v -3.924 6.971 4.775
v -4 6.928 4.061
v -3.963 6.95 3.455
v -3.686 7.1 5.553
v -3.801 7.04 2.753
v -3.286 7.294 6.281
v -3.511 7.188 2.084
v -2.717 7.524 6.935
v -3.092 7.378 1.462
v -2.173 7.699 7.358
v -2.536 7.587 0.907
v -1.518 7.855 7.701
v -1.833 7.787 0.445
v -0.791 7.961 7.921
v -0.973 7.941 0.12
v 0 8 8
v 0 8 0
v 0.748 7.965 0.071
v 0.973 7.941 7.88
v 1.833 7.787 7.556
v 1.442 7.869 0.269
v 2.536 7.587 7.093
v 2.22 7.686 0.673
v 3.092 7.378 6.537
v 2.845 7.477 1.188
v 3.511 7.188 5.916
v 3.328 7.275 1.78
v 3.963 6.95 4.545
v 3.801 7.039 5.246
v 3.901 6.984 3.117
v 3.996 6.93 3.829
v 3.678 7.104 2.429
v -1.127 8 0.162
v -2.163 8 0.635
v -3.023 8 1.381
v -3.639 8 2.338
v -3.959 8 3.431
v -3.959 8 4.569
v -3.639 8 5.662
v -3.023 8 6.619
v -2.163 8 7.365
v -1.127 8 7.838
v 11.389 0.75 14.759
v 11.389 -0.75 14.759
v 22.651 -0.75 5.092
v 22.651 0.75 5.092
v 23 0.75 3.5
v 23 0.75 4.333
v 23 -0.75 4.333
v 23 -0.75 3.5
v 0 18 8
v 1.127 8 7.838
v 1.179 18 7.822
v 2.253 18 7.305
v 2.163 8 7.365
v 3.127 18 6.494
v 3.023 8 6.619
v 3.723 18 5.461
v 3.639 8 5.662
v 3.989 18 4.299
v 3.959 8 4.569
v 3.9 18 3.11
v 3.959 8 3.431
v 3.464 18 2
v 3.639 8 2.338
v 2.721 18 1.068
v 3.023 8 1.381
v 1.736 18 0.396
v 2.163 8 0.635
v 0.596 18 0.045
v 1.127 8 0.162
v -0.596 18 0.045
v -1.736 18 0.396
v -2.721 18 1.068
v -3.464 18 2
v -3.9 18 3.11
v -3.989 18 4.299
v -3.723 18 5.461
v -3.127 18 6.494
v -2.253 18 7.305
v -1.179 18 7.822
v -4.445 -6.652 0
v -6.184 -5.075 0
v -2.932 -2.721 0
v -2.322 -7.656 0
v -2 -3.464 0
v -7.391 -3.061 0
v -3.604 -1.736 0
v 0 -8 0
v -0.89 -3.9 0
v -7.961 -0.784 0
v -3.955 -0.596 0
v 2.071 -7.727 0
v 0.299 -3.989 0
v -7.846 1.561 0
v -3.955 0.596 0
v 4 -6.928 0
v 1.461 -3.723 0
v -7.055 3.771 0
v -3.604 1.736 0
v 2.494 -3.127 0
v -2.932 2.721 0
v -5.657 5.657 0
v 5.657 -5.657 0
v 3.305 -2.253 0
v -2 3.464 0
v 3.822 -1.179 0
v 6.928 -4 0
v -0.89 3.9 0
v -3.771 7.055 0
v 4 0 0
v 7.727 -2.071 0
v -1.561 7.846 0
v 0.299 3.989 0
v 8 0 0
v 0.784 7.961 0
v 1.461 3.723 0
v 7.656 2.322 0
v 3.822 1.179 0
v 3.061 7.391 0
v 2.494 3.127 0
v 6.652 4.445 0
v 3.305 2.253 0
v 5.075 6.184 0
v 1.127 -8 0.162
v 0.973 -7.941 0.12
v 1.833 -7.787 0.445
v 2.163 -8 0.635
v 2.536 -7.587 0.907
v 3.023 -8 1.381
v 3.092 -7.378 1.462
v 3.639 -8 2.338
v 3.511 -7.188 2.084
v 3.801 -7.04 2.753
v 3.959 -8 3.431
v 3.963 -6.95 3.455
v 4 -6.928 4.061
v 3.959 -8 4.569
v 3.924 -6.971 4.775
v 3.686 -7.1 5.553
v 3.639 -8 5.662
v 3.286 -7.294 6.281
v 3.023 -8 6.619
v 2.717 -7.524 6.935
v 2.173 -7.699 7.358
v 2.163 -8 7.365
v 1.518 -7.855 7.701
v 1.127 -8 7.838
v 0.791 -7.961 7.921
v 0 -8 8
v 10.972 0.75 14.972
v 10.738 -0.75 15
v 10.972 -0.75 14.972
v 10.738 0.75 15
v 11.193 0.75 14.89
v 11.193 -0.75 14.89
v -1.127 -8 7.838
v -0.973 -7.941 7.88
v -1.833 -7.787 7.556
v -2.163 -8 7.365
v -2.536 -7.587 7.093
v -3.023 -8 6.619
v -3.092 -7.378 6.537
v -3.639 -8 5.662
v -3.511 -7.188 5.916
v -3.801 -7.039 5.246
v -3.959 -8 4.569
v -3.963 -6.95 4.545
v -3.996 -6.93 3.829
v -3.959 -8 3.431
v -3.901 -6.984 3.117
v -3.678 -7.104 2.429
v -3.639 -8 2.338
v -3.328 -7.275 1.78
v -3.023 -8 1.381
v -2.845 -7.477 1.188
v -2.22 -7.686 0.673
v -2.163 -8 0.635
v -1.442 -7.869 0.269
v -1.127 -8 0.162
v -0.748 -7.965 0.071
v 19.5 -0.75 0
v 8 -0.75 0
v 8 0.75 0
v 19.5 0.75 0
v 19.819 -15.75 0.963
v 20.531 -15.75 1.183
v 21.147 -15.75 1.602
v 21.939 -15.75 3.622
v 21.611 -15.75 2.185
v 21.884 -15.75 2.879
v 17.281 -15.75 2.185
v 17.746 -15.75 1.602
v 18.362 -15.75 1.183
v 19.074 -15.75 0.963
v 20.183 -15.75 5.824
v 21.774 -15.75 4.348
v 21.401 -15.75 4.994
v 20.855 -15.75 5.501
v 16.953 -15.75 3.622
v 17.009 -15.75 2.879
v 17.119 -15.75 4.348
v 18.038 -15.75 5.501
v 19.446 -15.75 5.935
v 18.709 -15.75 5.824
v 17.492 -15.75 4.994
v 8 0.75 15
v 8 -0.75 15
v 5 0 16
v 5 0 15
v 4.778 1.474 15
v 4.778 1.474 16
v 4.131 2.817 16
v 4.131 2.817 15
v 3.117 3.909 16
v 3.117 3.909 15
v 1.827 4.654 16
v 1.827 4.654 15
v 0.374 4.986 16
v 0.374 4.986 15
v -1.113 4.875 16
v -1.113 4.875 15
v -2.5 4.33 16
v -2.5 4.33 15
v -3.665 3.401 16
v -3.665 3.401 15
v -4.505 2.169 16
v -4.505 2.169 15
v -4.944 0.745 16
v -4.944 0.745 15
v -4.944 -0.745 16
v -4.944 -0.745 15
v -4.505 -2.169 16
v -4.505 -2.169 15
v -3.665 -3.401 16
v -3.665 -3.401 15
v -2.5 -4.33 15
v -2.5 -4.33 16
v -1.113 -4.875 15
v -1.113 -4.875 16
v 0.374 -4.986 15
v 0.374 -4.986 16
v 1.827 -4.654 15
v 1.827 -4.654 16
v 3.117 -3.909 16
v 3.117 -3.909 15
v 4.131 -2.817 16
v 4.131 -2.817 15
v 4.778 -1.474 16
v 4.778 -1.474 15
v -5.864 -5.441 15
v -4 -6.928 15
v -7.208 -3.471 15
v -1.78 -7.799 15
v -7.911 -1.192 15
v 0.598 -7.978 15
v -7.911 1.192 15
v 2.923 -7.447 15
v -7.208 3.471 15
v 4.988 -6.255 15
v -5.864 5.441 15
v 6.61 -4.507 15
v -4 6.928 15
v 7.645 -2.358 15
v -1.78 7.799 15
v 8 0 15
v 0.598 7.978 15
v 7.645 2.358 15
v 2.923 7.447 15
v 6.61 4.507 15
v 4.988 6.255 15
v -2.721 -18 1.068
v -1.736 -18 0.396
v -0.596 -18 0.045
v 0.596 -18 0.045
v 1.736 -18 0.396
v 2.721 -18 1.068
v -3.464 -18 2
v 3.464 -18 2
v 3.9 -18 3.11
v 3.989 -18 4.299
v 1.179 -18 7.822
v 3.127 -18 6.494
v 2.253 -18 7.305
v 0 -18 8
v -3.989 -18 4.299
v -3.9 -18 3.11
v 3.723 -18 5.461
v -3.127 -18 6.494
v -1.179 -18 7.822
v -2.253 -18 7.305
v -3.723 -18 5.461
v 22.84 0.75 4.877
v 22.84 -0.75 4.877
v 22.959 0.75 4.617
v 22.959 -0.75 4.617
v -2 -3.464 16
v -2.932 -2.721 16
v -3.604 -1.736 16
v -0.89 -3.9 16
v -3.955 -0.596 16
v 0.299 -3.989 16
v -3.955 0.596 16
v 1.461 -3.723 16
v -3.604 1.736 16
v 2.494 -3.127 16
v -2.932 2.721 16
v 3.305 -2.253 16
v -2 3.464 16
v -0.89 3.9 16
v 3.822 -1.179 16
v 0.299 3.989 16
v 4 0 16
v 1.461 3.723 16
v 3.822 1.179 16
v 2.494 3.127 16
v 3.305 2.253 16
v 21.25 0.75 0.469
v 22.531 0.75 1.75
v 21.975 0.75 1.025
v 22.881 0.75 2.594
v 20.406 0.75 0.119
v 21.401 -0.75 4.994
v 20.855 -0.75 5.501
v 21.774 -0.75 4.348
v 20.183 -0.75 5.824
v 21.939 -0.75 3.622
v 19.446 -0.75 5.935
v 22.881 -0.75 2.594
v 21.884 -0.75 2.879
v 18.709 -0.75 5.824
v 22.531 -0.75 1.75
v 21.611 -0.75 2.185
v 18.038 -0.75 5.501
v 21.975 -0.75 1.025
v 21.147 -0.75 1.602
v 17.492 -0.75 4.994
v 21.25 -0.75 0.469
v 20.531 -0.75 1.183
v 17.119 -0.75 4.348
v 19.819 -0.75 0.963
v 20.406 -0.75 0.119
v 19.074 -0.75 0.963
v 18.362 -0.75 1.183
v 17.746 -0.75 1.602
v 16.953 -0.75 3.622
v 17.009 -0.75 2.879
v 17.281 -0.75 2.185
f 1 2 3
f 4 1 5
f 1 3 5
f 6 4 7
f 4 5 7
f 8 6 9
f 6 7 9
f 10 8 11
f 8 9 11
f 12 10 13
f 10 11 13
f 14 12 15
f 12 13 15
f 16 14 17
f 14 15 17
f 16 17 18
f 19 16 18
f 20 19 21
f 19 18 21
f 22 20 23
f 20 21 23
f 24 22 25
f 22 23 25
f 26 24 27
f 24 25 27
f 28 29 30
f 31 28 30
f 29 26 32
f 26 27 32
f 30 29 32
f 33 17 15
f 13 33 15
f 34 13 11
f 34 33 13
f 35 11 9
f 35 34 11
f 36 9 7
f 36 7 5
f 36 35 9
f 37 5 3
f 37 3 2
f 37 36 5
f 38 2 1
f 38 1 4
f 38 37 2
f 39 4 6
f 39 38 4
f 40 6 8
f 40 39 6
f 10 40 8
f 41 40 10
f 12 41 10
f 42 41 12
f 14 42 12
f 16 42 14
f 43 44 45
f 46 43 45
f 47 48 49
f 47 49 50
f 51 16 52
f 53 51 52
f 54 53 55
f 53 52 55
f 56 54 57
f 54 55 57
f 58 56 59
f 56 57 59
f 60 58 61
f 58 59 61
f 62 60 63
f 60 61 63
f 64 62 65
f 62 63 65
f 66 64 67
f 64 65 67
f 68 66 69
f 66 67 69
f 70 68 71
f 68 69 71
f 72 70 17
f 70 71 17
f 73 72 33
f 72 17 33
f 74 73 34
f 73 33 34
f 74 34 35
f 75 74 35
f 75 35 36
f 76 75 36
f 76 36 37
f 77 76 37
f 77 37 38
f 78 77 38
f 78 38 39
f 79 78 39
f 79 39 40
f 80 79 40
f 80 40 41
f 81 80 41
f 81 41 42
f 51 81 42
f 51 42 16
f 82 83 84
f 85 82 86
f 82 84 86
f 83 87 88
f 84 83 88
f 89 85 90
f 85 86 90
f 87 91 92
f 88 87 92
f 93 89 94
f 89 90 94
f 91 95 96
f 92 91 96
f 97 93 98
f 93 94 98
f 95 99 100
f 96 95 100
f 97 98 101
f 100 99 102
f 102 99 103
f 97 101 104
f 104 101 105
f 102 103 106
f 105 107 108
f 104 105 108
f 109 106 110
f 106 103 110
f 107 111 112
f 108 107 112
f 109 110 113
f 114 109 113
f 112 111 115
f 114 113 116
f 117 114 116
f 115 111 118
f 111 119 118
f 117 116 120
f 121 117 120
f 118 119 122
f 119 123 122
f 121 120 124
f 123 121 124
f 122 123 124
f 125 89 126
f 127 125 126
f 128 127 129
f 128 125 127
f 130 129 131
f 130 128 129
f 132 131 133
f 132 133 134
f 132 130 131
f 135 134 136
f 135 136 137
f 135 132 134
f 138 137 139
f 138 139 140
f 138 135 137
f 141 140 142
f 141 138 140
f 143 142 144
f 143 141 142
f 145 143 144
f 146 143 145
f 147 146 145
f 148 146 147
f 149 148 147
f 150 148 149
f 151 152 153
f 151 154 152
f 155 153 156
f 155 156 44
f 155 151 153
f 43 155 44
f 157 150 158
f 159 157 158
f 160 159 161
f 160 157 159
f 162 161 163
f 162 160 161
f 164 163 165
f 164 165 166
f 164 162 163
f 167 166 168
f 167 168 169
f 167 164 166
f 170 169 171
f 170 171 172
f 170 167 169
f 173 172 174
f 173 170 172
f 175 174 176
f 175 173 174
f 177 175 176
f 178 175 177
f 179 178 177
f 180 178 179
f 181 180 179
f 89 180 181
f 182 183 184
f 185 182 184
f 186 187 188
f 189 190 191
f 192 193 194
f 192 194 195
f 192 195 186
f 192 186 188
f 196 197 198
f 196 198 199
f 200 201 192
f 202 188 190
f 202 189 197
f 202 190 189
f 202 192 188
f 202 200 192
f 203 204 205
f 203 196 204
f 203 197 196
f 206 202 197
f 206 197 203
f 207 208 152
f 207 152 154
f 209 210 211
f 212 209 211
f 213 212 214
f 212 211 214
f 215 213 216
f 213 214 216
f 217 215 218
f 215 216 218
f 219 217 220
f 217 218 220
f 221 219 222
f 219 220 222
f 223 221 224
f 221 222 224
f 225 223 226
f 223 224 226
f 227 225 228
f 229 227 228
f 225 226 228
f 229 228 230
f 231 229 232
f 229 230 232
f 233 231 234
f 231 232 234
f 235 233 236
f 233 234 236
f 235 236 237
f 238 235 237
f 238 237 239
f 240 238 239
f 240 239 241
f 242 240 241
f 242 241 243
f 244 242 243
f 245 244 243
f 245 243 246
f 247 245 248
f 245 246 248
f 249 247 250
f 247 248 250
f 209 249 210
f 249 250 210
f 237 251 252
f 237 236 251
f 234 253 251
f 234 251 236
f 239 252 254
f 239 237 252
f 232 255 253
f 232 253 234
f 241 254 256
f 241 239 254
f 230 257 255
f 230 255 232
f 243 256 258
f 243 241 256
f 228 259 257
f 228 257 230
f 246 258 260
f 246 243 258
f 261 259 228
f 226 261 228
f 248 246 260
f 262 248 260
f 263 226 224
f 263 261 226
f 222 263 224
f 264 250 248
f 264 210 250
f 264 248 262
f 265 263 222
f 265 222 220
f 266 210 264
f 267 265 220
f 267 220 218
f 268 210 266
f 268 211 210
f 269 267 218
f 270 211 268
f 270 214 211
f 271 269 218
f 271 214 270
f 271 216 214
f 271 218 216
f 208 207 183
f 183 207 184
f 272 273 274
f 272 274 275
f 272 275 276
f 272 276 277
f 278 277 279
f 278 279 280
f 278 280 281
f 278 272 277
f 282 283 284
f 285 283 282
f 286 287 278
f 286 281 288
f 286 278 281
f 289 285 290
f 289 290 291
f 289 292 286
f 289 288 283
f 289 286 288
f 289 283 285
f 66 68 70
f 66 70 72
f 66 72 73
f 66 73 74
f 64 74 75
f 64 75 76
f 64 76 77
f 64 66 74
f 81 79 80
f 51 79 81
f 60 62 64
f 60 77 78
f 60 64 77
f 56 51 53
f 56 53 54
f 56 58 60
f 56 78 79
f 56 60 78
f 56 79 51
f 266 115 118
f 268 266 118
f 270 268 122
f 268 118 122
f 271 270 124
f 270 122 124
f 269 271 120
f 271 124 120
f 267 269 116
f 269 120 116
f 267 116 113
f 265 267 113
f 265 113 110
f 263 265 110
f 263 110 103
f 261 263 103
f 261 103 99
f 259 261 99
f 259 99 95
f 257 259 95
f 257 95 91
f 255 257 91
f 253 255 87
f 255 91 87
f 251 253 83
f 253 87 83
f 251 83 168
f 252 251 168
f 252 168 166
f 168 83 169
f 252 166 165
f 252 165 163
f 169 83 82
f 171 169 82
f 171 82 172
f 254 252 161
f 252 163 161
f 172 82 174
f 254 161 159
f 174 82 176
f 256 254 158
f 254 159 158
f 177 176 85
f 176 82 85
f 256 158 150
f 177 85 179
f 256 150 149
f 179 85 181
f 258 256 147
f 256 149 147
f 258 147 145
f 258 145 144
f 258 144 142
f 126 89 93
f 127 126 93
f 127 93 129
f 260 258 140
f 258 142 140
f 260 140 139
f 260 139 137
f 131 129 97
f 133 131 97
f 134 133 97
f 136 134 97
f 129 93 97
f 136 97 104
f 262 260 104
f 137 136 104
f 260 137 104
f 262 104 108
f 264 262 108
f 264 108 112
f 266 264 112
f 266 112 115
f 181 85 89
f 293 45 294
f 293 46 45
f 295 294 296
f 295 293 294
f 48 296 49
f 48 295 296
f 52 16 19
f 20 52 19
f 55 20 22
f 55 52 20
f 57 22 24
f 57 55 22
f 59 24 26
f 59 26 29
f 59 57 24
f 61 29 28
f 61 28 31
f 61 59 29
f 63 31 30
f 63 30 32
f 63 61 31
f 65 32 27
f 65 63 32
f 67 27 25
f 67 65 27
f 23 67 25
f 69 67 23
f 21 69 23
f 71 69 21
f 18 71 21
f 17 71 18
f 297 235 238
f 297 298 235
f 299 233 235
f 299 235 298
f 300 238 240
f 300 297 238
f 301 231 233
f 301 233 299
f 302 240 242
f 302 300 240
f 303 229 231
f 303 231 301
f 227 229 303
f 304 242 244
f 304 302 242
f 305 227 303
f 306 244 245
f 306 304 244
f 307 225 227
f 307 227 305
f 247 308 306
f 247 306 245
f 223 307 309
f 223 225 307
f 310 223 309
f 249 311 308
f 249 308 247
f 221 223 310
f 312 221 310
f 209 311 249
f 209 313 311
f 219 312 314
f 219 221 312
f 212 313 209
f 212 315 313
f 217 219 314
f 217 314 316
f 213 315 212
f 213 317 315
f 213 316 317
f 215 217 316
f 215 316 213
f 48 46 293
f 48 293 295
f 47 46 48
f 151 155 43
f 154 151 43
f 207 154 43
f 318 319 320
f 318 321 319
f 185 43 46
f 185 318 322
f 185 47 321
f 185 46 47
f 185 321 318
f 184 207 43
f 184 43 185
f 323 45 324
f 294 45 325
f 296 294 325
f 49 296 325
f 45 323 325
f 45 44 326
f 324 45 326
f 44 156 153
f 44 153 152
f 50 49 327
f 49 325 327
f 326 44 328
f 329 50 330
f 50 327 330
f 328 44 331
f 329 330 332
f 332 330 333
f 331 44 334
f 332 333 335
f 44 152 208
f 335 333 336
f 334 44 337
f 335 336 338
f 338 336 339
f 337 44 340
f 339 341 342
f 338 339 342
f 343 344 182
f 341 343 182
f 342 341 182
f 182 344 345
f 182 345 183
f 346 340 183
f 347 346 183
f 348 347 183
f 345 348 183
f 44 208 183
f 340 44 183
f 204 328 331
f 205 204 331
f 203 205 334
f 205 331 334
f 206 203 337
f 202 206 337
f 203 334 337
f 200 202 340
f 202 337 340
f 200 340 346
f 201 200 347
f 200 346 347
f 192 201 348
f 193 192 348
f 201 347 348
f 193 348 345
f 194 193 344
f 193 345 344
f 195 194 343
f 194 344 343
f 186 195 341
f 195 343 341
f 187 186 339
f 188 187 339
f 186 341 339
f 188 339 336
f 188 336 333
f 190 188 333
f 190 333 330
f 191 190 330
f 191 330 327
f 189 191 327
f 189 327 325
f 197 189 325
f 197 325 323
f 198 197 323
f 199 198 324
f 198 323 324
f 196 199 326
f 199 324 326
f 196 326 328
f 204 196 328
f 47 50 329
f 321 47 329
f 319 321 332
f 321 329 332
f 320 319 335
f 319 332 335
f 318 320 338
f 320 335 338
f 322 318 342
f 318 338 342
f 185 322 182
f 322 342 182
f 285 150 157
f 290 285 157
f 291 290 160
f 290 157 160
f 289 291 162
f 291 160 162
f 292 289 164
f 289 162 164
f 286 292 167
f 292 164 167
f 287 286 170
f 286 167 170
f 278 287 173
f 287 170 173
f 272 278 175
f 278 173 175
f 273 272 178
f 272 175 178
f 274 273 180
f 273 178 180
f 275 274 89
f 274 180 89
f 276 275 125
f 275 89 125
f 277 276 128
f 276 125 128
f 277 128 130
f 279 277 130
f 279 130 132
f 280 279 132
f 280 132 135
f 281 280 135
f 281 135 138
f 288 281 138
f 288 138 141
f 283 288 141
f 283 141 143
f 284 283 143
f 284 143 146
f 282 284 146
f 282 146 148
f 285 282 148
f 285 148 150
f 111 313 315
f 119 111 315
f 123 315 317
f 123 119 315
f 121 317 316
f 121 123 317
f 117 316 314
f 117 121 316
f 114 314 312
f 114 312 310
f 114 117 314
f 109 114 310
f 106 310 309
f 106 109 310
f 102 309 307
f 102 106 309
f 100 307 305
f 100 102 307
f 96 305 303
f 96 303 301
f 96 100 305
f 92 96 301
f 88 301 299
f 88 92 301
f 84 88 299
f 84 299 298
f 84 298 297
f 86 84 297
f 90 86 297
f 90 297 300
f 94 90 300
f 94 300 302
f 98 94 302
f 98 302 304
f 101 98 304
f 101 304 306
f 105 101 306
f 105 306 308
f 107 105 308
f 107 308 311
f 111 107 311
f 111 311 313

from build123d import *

# Parameters (mm, degrees)
SKETCH1_R                            = 8
BOSS_EXTRUDE1_DEPTH                  = 15
SKETCH2_R                            = 5
SKETCH2_R_2                          = 4
BOSS_EXTRUDE2_DEPTH                  = 1
CUT_EXTRUDE1_START                   = -15
SKETCH3_R                            = 4
CUT_EXTRUDE1_DEPTH                   = 15
SKETCH4_R                            = 4
BOSS_EXTRUDE3_DEPTH                  = 10
BOSS_EXTRUDE3_DIRECTION_2_REACH      = 26
BOSS_EXTRUDE3_DIRECTION_2_END_RADIUS = 8
SKETCH6_R                            = 4
BOSS_EXTRUDE4_DEPTH                  = 10
BOSS_EXTRUDE4_DIRECTION_2_REACH      = 33.559
BOSS_EXTRUDE4_DIRECTION_2_END_RADIUS = 8
SKETCH7_W                            = 15
SKETCH7_H                            = 1.5
BOSS_EXTRUDE5_DEPTH                  = 15
CUT_EXTRUDE2_DEPTH                   = 15
CUT_EXTRUDE3_DEPTH                   = 15
FILLET1_R                            = 1
FILLET2_R                            = 1
SKETCH12_R                           = 2.5
BOSS_EXTRUDE6_DEPTH                  = 15


with BuildPart() as part:
    # Sketch1 → Boss-Extrude1 (new body)
    with BuildSketch(Plane.XY):
        Circle(SKETCH1_R)
    extrude(amount=BOSS_EXTRUDE1_DEPTH)

    # Sketch2 → Boss-Extrude2 (add)
    with BuildSketch(Plane.XY.offset(15)):
        Circle(SKETCH2_R)
        Circle(SKETCH2_R_2, mode=Mode.SUBTRACT)
    extrude(amount=BOSS_EXTRUDE2_DEPTH)

    # Sketch3 → Cut-Extrude1 (cut)
    with BuildSketch(Plane.XY.offset(15).offset(CUT_EXTRUDE1_START)):
        Circle(SKETCH3_R)
    extrude(amount=CUT_EXTRUDE1_DEPTH, mode=Mode.SUBTRACT)

    # Sketch6 → Boss-Extrude4 (add)
    with BuildSketch(Plane(origin=(0, -8, 0), x_dir=(-1, 0, 0), z_dir=(0, -1, 0))):
        with Locations(Location((0, -4, 0), (0, 0, 270))):
            Circle(SKETCH6_R)
    extrude(amount=BOSS_EXTRUDE4_DEPTH)

    # Boss-Extrude4 direction 2: up to this cylinder (the profile starts outside it)
    boss_extrude4_direction_2_end = Plane(origin=(0, 0, 4), z_dir=(0, 0, -1)) * Cylinder(BOSS_EXTRUDE4_DIRECTION_2_END_RADIUS, 84.118, mode=Mode.PRIVATE)
    # Sketch6 → Boss-Extrude4 direction 2 (add, up to the surface)
    with BuildSketch(Plane(origin=(0, -8, 0), x_dir=(-1, 0, 0), z_dir=(0, -1, 0)), mode=Mode.PRIVATE) as boss_extrude4_direction_2_sk1:
        with Locations(Location((0, -4, 0), (0, 0, 270))):
            Circle(SKETCH6_R)
    boss_extrude4_direction_2_tool1 = extrude(boss_extrude4_direction_2_sk1.sketch, amount=-BOSS_EXTRUDE4_DIRECTION_2_REACH, mode=Mode.PRIVATE) - boss_extrude4_direction_2_end
    add(boss_extrude4_direction_2_tool1.solids().sort_by_distance((0, -8, 4))[0])
    add(boss_extrude4_direction_2_tool1.solids().sort_by_distance((0, -8, 4))[1])


with BuildPart() as body_2:
    # Sketch4 → Boss-Extrude3 (new body)
    with BuildSketch(Plane(origin=(0, 8, 0), x_dir=(1, 0, 0), z_dir=(0, 1, 0))):
        with Locations(Location((0, -4, 0), (0, 0, 270))):
            Circle(SKETCH4_R)
    extrude(amount=BOSS_EXTRUDE3_DEPTH)

    # Boss-Extrude3 direction 2: up to this cylinder (the profile starts outside it)
    boss_extrude3_direction_2_end = Plane(origin=(0, 0, 4), z_dir=(0, 0, -1)) * Cylinder(BOSS_EXTRUDE3_DIRECTION_2_END_RADIUS, 69, mode=Mode.PRIVATE)
    # Sketch4 → Boss-Extrude3 direction 2 (add, up to the surface)
    with BuildSketch(Plane(origin=(0, 8, 0), x_dir=(1, 0, 0), z_dir=(0, 1, 0)), mode=Mode.PRIVATE) as boss_extrude3_direction_2_sk1:
        with Locations(Location((0, -4, 0), (0, 0, 270))):
            Circle(SKETCH4_R)
    boss_extrude3_direction_2_tool1 = extrude(boss_extrude3_direction_2_sk1.sketch, amount=-BOSS_EXTRUDE3_DIRECTION_2_REACH, mode=Mode.PRIVATE) - boss_extrude3_direction_2_end
    add(boss_extrude3_direction_2_tool1.solids().sort_by_distance((0, 8, 4))[0])
    add(boss_extrude3_direction_2_tool1.solids().sort_by_distance((0, 8, 4))[1])


with BuildPart() as body_3:
    # Sketch7 → Boss-Extrude5 (new body)
    with BuildSketch(Plane(origin=(8, 0, 0), x_dir=(0, 0, -1), z_dir=(1, 0, 0))):
        with Locations((-7.5, 0)):
            Rectangle(SKETCH7_W, SKETCH7_H)
    extrude(amount=BOSS_EXTRUDE5_DEPTH)

    # Sketch9 → Cut-Extrude2 (cut)
    with BuildSketch(Plane.XZ.offset(0.75)):
        with BuildLine():
            ThreePointArc((23, 3.5), (21.974873734, 1.025126266), (19.5, 0))
            Line((19.5, 0), (23, 0))
            Line((23, 0), (23, 3.5))
        make_face()
    extrude(amount=-CUT_EXTRUDE2_DEPTH, mode=Mode.SUBTRACT)

    # Sketch11 → Cut-Extrude3 (cut)
    with BuildSketch(Plane(origin=(0, -0.75, 0), x_dir=(-1, 0, 0), z_dir=(0, -1, 0))):
        Polygon((-23, -15), (-11.108053079, -15), (-23, -4.792841708), align=None)
    extrude(amount=-CUT_EXTRUDE3_DEPTH, mode=Mode.SUBTRACT)

    # Fillet1
    fillet1_edges = [body_3.edges().sort_by_distance(p)[0] for p in [
        (11.108053079, 0, 15),
    ]]
    fillet(fillet1_edges, radius=FILLET1_R)

    # Fillet2
    fillet2_edges = [body_3.edges().sort_by_distance(p)[0] for p in [
        (23, 0, 4.792841708),
    ]]
    fillet(fillet2_edges, radius=FILLET2_R)

    # Sketch12 → Boss-Extrude6 (add)
    with BuildSketch(Plane.XZ.offset(0.75)):
        with Locations(Location((19.446318933, 3.434994956, 0), (0, 0, 90))):
            Circle(SKETCH12_R)
    extrude(amount=BOSS_EXTRUDE6_DEPTH)


solid = Compound([part.part, body_2.part, body_3.part])
